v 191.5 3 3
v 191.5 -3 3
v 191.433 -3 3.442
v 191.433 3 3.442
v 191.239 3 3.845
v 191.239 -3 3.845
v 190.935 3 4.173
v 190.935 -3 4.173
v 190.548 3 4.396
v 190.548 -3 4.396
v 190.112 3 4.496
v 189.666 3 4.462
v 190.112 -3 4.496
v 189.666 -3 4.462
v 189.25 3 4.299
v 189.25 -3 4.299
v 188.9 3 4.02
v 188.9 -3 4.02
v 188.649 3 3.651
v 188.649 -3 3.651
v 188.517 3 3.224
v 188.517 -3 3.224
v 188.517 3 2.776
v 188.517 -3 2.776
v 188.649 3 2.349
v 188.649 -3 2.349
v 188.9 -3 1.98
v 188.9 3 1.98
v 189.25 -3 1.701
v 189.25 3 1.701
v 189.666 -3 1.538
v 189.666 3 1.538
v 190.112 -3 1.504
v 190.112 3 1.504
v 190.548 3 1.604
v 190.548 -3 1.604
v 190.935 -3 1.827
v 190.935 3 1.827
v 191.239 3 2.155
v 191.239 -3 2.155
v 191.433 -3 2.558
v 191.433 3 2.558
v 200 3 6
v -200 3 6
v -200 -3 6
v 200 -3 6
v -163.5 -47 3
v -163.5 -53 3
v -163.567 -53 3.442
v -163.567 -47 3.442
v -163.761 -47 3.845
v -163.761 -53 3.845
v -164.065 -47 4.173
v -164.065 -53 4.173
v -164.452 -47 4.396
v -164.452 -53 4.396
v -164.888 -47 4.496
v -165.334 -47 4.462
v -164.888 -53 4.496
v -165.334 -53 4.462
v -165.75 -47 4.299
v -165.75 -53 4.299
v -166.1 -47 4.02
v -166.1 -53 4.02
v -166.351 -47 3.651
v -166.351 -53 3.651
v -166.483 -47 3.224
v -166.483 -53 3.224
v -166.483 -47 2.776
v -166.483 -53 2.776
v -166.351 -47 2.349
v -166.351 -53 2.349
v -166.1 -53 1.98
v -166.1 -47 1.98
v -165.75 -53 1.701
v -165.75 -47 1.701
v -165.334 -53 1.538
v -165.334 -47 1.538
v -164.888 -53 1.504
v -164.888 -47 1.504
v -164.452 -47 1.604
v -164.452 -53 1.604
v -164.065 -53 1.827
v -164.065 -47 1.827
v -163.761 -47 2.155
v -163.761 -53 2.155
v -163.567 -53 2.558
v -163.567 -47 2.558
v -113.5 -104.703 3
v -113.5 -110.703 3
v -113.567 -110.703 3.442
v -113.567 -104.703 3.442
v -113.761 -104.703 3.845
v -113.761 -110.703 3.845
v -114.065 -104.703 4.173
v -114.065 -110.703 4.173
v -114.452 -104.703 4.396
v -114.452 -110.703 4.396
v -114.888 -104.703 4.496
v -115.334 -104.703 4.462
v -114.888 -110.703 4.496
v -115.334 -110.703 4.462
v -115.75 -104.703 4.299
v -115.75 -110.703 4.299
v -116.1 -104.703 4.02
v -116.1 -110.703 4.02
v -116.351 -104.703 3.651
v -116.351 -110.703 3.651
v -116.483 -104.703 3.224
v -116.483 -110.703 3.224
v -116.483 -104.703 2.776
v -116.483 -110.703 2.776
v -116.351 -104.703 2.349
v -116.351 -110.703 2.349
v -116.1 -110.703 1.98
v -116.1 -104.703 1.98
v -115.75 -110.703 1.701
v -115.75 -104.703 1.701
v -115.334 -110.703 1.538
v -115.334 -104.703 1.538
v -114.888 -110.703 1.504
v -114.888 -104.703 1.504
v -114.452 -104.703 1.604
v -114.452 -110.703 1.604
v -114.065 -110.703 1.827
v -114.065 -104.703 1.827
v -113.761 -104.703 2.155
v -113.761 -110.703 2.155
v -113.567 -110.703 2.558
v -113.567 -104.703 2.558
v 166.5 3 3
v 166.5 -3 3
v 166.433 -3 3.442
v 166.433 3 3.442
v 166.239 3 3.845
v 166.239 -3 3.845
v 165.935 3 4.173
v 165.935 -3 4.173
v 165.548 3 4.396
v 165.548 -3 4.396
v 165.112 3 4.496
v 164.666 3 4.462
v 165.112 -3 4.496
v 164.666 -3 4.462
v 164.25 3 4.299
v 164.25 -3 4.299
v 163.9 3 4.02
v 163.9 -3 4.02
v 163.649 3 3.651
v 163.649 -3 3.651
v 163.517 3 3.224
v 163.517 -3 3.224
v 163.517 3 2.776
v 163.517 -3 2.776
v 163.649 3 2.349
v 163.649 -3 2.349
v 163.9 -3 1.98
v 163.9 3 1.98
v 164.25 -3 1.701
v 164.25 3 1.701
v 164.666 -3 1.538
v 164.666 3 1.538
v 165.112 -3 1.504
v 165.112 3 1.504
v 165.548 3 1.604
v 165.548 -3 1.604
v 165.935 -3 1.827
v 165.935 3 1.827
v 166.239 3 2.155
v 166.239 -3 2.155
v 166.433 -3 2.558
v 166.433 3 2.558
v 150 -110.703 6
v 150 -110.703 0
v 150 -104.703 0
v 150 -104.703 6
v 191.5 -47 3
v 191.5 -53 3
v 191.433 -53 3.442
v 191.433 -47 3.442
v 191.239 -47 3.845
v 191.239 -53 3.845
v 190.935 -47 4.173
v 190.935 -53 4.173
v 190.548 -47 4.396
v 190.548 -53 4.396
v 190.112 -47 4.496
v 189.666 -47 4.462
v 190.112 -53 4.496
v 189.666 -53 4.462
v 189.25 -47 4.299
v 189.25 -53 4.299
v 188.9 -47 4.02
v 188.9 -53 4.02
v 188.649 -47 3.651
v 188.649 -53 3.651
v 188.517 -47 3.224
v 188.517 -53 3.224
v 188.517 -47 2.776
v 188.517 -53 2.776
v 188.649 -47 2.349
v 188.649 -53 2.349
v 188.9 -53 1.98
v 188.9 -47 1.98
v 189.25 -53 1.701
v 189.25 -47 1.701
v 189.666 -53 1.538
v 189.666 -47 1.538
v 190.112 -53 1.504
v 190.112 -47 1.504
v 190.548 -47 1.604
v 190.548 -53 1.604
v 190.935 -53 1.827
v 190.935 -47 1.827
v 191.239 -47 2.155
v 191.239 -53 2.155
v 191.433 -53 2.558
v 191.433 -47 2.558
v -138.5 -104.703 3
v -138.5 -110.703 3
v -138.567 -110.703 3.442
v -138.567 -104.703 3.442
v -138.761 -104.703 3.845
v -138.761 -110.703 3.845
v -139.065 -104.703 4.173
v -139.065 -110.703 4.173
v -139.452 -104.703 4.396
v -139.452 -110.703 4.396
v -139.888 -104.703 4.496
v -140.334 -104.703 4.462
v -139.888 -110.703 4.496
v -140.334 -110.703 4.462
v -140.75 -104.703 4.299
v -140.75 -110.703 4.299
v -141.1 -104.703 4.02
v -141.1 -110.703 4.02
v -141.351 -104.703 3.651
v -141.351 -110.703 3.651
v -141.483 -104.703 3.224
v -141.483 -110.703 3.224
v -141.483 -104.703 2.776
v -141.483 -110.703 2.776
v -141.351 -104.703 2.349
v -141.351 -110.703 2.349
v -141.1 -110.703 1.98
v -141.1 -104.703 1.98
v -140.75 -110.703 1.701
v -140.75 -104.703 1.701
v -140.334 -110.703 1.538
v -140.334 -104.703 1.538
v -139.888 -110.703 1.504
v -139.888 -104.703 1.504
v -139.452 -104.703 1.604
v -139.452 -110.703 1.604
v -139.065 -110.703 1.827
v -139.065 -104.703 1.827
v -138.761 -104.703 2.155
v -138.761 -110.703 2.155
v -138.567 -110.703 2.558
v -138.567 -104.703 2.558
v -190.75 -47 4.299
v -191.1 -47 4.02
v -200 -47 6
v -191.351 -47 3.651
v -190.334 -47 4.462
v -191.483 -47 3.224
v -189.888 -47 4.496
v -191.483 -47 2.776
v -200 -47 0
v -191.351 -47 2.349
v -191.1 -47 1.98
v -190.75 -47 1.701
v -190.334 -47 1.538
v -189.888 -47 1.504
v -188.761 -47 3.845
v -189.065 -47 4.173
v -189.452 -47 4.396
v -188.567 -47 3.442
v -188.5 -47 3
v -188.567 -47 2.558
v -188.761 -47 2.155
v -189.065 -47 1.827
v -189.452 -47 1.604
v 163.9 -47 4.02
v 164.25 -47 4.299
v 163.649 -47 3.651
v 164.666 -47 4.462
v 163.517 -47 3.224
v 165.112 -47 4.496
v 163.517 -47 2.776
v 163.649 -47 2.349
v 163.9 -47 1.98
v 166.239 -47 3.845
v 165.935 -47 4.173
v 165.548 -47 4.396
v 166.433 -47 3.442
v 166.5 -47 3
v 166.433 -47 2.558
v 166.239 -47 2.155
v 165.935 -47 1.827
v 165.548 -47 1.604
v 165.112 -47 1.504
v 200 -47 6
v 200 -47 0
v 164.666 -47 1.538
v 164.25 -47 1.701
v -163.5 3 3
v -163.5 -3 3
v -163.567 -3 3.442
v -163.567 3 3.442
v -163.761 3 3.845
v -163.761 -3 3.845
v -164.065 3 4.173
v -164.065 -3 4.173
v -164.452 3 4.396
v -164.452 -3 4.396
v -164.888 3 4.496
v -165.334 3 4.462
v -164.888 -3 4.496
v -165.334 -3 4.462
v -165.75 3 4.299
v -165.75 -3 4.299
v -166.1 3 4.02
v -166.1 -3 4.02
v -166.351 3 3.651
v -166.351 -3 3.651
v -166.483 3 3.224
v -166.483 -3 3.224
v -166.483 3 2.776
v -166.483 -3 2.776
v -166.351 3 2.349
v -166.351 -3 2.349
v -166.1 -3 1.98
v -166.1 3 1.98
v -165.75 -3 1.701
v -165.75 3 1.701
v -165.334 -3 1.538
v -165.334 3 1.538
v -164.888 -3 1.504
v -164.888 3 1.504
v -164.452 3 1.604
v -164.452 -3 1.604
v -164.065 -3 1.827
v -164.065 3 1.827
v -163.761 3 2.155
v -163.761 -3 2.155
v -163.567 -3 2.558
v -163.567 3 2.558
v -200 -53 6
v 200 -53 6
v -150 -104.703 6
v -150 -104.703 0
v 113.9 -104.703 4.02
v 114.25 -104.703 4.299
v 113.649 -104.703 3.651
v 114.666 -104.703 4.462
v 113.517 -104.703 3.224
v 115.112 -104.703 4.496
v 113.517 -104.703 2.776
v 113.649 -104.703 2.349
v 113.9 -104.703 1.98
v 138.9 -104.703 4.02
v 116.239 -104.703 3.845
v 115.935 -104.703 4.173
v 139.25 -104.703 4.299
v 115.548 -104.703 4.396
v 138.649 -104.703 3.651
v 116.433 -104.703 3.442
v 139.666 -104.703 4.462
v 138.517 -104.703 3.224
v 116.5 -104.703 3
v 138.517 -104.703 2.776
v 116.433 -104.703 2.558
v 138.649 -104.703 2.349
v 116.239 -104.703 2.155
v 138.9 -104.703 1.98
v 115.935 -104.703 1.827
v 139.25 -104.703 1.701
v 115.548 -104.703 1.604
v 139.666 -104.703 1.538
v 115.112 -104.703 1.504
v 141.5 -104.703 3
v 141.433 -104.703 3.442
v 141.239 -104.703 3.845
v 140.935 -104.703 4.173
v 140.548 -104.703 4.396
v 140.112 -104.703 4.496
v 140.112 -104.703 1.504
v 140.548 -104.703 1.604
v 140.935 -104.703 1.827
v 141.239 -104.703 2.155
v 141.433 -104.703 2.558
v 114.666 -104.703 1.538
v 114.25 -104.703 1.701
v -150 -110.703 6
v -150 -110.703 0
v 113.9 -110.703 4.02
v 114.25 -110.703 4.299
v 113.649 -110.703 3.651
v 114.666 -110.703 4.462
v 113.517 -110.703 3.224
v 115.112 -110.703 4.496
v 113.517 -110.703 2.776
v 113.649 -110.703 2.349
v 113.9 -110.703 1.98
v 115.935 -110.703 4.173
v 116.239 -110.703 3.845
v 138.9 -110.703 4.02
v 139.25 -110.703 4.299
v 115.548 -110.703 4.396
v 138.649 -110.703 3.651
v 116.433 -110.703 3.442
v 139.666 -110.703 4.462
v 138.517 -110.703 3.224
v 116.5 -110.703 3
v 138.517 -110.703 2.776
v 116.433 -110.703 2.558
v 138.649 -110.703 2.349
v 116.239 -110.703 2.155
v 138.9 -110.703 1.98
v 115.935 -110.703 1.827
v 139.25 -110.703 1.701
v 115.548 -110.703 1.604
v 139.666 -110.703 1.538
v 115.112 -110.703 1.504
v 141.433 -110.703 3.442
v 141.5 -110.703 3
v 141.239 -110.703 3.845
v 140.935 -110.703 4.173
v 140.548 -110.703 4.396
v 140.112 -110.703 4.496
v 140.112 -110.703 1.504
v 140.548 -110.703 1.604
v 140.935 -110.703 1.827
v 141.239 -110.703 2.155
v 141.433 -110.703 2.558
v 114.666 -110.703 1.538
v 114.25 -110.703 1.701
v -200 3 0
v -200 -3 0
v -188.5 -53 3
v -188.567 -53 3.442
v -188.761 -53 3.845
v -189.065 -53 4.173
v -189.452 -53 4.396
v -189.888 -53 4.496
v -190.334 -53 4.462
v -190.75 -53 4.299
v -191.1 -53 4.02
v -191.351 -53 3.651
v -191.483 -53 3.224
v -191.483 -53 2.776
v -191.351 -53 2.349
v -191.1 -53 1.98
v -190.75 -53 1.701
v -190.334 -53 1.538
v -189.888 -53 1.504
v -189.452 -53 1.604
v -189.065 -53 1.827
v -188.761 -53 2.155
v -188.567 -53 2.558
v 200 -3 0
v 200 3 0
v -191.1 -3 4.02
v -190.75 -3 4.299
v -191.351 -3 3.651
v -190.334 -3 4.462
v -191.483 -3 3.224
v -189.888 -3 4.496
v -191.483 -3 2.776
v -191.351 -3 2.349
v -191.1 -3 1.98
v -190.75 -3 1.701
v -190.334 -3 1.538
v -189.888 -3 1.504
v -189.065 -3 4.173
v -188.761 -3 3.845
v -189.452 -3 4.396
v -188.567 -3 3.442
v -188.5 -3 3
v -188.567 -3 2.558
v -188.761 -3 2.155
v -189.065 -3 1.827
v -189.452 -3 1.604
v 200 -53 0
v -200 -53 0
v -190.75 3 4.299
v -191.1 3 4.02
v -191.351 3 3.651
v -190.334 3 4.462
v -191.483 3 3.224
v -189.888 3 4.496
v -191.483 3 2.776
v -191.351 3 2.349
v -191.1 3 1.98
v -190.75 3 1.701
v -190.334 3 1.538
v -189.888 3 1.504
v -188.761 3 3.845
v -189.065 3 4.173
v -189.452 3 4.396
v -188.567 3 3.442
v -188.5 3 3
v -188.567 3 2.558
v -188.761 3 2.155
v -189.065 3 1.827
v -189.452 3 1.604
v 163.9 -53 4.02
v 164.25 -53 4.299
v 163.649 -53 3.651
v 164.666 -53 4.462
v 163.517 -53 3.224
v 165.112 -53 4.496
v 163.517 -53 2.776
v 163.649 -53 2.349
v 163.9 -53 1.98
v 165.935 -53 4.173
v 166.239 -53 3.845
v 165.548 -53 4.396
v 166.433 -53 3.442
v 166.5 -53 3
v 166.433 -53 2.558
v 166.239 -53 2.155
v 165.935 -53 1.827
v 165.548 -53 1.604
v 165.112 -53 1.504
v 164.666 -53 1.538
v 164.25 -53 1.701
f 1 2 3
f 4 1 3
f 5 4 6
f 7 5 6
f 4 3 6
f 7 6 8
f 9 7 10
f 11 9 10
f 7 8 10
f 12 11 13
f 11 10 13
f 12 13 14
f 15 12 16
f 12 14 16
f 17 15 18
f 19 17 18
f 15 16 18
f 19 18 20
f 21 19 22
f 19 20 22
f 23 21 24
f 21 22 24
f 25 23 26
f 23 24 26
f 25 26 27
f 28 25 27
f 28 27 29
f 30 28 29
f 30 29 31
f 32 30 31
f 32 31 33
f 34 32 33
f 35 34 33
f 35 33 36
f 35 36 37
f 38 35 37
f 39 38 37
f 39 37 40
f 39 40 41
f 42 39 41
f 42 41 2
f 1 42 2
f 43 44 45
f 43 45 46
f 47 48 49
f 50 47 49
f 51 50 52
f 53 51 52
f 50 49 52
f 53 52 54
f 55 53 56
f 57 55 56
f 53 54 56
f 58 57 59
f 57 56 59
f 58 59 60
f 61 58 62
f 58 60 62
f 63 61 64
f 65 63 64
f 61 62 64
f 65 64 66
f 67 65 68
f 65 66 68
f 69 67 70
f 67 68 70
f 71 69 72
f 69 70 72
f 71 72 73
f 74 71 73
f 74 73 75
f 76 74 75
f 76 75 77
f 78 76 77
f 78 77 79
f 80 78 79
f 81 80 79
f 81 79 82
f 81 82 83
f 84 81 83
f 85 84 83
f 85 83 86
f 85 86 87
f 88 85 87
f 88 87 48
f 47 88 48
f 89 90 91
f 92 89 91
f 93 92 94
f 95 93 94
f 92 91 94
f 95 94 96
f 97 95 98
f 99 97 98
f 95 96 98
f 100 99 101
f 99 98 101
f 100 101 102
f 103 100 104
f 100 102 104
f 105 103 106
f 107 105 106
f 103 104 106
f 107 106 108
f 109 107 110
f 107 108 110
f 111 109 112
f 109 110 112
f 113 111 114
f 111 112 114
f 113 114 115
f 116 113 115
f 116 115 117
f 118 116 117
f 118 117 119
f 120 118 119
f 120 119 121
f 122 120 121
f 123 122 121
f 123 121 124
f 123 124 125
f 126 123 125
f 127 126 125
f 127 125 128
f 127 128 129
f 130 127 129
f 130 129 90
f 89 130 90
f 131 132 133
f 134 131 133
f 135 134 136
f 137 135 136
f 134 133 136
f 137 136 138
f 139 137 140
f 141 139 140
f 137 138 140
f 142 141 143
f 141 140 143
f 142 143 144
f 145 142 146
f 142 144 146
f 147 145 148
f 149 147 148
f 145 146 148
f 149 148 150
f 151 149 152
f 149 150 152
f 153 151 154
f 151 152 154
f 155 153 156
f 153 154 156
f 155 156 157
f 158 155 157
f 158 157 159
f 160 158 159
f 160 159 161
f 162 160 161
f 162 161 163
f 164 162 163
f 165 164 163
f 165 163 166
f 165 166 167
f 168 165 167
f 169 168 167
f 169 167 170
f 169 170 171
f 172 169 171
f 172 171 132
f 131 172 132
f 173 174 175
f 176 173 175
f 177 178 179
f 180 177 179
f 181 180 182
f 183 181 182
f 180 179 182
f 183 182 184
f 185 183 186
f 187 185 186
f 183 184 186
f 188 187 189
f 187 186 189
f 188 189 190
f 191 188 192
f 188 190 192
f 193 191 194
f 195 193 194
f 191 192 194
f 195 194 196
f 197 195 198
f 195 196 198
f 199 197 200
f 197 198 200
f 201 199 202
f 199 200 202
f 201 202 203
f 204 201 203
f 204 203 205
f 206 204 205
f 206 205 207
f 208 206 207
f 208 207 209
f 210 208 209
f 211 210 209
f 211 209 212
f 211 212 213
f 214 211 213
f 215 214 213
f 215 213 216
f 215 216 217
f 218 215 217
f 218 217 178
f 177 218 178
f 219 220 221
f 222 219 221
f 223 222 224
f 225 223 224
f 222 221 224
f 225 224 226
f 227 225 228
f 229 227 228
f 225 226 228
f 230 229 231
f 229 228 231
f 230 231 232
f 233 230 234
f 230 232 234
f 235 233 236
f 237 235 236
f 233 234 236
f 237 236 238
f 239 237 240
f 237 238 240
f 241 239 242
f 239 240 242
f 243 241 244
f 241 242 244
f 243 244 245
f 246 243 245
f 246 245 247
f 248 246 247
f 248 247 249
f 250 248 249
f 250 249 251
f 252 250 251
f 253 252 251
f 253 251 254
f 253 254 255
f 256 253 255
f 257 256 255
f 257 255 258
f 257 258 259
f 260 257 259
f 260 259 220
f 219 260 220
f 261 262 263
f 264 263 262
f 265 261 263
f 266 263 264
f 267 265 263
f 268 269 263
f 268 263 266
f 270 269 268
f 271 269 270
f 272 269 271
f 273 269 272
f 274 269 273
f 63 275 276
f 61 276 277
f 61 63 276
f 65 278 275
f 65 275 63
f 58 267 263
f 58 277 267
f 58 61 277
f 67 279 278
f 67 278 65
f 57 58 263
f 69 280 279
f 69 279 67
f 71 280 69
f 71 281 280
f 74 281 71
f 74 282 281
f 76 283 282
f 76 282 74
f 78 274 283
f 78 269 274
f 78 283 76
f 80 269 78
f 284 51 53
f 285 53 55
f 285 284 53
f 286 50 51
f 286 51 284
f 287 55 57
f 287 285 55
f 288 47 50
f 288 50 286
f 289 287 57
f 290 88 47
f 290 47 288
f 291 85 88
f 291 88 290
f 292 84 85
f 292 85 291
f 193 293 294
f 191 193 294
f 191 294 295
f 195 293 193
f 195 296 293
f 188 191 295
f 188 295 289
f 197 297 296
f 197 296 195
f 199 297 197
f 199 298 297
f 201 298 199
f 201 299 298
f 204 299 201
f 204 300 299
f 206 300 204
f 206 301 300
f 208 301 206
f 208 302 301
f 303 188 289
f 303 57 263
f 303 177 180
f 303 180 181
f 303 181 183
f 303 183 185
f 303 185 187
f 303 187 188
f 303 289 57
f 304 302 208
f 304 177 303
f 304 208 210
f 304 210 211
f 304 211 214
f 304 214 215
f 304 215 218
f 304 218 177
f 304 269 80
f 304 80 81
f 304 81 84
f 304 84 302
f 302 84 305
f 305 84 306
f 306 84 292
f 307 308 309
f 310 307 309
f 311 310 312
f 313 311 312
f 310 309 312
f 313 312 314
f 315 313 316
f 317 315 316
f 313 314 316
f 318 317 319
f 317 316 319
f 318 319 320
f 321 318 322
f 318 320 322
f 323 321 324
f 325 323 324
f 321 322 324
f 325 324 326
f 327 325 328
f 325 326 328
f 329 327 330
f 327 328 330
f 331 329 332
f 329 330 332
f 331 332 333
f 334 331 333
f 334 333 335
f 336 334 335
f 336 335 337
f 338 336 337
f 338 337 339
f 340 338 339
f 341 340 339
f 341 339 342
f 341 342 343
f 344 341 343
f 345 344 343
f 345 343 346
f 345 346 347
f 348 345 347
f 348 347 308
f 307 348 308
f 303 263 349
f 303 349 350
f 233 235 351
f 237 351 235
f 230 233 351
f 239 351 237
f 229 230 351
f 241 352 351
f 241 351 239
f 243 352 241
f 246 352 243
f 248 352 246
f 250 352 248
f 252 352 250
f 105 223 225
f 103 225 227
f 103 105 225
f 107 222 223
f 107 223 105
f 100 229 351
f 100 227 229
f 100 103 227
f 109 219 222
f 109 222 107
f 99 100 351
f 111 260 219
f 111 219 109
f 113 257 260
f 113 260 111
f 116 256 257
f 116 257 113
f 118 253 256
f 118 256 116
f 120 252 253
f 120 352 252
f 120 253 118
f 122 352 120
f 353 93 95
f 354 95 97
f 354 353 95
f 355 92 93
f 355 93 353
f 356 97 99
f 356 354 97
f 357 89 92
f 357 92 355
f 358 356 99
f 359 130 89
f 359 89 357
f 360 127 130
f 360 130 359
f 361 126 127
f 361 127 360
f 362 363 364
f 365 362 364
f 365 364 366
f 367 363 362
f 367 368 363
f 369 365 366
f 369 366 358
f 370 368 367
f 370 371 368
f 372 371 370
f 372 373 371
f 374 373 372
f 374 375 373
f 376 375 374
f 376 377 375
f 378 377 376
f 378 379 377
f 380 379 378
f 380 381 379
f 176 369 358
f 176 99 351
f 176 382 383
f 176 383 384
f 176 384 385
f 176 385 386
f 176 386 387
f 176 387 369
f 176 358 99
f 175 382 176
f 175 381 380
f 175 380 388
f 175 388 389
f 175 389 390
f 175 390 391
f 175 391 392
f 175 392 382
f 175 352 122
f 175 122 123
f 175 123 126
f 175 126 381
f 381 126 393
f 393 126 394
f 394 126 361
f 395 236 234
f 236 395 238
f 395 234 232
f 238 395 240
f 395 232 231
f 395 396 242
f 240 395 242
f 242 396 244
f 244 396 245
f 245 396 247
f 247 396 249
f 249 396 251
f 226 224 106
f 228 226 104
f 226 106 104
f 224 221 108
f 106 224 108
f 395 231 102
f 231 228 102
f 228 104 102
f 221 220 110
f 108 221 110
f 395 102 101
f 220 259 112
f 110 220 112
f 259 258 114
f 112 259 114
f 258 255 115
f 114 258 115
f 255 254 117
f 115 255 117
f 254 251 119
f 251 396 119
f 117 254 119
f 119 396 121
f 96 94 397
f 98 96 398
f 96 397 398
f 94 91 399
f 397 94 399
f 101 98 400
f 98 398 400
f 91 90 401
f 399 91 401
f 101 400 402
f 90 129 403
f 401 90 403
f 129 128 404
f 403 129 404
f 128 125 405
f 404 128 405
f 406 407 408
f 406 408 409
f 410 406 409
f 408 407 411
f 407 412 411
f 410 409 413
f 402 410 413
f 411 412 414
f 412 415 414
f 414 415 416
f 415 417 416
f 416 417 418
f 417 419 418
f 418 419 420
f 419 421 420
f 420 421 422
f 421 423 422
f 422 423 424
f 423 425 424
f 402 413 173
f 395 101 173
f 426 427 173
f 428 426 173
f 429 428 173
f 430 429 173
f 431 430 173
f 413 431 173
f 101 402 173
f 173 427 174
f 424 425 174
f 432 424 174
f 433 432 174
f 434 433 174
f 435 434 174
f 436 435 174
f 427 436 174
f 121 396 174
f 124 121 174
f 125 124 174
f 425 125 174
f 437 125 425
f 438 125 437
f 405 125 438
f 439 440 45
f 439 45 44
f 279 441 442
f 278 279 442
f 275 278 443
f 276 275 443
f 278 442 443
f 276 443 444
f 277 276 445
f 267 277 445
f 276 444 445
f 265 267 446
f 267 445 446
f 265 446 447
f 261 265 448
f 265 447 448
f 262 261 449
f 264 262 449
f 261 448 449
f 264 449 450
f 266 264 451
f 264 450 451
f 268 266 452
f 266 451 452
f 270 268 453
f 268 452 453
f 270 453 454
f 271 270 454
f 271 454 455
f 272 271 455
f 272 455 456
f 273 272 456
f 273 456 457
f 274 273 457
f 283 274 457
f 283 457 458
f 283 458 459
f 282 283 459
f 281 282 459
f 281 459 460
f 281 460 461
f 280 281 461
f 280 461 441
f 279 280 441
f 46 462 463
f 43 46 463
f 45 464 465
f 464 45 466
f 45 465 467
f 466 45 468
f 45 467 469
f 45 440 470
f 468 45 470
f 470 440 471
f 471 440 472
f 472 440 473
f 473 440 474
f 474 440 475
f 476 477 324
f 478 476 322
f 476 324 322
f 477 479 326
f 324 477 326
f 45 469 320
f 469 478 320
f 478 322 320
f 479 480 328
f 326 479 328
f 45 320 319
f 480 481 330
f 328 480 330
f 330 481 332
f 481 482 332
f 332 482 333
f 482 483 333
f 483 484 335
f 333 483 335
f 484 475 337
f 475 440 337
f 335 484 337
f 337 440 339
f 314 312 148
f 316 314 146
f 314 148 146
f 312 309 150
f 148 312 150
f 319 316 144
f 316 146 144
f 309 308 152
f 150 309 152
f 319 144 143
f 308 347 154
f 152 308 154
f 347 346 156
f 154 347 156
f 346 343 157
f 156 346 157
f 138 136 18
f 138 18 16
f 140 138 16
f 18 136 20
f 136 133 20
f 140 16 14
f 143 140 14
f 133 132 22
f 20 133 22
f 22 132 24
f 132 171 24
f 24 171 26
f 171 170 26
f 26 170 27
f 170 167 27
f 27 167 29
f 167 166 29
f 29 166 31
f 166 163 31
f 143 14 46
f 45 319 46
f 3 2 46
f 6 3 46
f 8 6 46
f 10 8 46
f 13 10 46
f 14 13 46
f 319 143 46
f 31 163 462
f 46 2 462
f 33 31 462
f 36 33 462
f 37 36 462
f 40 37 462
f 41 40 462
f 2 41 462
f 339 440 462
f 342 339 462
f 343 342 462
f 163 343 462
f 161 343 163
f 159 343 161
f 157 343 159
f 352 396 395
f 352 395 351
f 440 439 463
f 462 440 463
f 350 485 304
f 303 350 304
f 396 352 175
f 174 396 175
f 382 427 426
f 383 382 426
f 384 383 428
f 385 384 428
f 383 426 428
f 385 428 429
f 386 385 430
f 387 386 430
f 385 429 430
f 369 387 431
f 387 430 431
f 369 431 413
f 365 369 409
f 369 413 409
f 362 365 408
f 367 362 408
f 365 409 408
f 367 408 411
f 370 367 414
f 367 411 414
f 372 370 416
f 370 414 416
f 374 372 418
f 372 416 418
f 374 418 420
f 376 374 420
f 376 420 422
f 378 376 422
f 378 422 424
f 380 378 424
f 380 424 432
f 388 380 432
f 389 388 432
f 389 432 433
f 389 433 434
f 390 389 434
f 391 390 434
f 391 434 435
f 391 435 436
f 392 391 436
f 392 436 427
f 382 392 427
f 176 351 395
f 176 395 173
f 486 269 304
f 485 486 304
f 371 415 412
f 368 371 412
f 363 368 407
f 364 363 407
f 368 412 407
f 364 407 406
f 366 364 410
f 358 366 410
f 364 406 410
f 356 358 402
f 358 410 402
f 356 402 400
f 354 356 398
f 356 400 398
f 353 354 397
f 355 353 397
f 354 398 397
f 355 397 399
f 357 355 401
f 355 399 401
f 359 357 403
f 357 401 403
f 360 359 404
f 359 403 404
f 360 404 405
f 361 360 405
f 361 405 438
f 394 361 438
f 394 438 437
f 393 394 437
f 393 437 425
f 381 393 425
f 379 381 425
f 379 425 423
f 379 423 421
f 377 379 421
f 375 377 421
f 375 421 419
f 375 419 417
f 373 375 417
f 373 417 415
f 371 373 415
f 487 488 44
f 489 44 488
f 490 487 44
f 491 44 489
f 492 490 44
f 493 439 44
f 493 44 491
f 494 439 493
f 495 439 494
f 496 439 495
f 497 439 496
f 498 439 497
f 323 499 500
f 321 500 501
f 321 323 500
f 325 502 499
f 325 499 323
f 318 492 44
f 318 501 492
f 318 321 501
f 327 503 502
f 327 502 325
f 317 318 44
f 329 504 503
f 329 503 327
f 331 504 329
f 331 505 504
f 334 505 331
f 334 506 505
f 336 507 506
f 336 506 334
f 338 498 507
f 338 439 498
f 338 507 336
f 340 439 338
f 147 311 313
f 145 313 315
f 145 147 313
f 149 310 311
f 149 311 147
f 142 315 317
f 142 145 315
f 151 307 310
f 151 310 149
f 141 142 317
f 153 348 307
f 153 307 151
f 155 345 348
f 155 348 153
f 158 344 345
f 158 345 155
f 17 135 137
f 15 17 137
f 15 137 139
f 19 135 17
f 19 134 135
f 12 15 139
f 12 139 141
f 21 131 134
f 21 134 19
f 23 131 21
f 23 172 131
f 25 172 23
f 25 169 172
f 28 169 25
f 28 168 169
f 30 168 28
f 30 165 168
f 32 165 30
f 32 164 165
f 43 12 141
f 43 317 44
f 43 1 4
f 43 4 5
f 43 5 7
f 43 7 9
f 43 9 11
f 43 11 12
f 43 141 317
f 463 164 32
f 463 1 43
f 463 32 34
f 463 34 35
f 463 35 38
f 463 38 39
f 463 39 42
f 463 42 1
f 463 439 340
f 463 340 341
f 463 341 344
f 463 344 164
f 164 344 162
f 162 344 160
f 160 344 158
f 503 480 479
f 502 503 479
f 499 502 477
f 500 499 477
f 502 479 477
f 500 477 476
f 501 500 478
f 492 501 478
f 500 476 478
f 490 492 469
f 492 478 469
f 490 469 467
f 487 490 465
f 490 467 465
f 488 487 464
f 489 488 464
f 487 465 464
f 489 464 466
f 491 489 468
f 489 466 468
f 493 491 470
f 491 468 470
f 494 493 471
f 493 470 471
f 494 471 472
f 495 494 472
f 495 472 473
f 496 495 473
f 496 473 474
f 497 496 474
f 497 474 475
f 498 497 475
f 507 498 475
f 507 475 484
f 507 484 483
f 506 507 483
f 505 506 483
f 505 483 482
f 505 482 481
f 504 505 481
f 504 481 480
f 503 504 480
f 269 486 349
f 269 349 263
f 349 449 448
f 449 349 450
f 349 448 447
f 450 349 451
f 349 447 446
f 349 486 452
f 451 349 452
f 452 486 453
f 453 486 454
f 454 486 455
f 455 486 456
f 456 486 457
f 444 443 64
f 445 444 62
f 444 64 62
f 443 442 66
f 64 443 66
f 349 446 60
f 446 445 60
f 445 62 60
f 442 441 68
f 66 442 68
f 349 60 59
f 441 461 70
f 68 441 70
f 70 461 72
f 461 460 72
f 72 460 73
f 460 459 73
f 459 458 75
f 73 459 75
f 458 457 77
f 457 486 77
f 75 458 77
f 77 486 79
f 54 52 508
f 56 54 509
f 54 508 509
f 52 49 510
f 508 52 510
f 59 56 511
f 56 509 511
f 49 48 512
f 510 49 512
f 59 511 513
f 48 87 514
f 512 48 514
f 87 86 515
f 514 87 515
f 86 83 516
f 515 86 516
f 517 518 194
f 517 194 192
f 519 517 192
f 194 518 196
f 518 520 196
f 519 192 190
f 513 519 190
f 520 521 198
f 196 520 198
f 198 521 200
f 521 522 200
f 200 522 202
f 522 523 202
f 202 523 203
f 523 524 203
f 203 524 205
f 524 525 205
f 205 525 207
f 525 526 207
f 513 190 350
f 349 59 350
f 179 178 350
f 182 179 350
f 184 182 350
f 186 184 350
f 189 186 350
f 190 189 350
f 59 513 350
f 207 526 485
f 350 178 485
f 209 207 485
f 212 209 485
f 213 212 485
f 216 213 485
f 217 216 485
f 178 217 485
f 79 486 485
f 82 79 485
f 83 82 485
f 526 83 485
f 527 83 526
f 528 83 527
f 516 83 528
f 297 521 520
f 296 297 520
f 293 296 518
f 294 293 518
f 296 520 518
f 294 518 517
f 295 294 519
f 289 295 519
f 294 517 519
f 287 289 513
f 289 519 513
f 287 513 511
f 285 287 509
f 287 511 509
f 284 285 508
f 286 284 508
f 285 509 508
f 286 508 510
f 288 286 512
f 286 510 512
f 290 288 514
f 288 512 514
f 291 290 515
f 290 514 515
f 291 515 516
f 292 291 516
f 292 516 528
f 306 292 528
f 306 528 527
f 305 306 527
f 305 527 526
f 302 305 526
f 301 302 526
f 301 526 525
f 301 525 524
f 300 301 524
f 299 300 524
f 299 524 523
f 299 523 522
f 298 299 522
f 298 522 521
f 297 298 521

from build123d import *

# Parameters (mm, degrees)
F0_W      = 400
F0_H      = 6
F1_DEPTH  = 6
F2_W      = 400
F2_H      = 6
F3_DEPTH  = 6
F4_R      = 1.5
F5_DEPTH  = 6.001
F6_R      = 1.5
F7_DEPTH  = 56.001
F0_W_2    = 300
F8_DEPTH  = 6
F9_R      = 1.5
F10_DEPTH = 113.7042961427


with BuildPart() as f1:
    # F0 (on Top) → F1 (new body)
    with BuildSketch(Plane.XY):
        Rectangle(F0_W, F0_H)
    extrude(amount=F1_DEPTH)

    # F4 (on face) → F5 (cut, through all)
    with BuildSketch(Plane.XZ.offset(3)):
        with Locations((190, 3)):
            Circle(F4_R)
        with Locations((165, 3)):
            Circle(F4_R)
        with Locations((-190, 3)):
            Circle(F4_R)
        with Locations((-165, 3)):
            Circle(F4_R)
    extrude(amount=-F5_DEPTH, mode=Mode.SUBTRACT)


with BuildPart() as f3:
    # F2 (on Top) → F3 (new body)
    with BuildSketch(Plane.XY):
        with Locations((0, -50)):
            Rectangle(F2_W, F2_H)
    extrude(amount=F3_DEPTH)

    # F6 (on face) → F7 (cut, through all)
    with BuildSketch(Plane.XZ.offset(53)):
        with Locations((190, 3)):
            Circle(F6_R)
        with Locations((165, 3)):
            Circle(F6_R)
        with Locations((-190, 3)):
            Circle(F6_R)
        with Locations((-165, 3)):
            Circle(F6_R)
    extrude(amount=-F7_DEPTH, mode=Mode.SUBTRACT)


with BuildPart() as f8:
    # F0 (on Top) → F8 (new body)
    with BuildSketch(Plane.XY):
        with Locations((0, -107.7032961427)):
            Rectangle(F0_W_2, F0_H)
    extrude(amount=F8_DEPTH)

    # F9 (on face) → F10 (cut, through all)
    with BuildSketch(Plane.XZ.offset(110.7032961427)):
        with Locations((140, 3)):
            Circle(F9_R)
        with Locations((115, 3)):
            Circle(F9_R)
        with Locations((-115, 3)):
            Circle(F9_R)
        with Locations((-140, 3)):
            Circle(F9_R)
    extrude(amount=-F10_DEPTH, mode=Mode.SUBTRACT)


solid = Compound([f1.part, f3.part, f8.part])
